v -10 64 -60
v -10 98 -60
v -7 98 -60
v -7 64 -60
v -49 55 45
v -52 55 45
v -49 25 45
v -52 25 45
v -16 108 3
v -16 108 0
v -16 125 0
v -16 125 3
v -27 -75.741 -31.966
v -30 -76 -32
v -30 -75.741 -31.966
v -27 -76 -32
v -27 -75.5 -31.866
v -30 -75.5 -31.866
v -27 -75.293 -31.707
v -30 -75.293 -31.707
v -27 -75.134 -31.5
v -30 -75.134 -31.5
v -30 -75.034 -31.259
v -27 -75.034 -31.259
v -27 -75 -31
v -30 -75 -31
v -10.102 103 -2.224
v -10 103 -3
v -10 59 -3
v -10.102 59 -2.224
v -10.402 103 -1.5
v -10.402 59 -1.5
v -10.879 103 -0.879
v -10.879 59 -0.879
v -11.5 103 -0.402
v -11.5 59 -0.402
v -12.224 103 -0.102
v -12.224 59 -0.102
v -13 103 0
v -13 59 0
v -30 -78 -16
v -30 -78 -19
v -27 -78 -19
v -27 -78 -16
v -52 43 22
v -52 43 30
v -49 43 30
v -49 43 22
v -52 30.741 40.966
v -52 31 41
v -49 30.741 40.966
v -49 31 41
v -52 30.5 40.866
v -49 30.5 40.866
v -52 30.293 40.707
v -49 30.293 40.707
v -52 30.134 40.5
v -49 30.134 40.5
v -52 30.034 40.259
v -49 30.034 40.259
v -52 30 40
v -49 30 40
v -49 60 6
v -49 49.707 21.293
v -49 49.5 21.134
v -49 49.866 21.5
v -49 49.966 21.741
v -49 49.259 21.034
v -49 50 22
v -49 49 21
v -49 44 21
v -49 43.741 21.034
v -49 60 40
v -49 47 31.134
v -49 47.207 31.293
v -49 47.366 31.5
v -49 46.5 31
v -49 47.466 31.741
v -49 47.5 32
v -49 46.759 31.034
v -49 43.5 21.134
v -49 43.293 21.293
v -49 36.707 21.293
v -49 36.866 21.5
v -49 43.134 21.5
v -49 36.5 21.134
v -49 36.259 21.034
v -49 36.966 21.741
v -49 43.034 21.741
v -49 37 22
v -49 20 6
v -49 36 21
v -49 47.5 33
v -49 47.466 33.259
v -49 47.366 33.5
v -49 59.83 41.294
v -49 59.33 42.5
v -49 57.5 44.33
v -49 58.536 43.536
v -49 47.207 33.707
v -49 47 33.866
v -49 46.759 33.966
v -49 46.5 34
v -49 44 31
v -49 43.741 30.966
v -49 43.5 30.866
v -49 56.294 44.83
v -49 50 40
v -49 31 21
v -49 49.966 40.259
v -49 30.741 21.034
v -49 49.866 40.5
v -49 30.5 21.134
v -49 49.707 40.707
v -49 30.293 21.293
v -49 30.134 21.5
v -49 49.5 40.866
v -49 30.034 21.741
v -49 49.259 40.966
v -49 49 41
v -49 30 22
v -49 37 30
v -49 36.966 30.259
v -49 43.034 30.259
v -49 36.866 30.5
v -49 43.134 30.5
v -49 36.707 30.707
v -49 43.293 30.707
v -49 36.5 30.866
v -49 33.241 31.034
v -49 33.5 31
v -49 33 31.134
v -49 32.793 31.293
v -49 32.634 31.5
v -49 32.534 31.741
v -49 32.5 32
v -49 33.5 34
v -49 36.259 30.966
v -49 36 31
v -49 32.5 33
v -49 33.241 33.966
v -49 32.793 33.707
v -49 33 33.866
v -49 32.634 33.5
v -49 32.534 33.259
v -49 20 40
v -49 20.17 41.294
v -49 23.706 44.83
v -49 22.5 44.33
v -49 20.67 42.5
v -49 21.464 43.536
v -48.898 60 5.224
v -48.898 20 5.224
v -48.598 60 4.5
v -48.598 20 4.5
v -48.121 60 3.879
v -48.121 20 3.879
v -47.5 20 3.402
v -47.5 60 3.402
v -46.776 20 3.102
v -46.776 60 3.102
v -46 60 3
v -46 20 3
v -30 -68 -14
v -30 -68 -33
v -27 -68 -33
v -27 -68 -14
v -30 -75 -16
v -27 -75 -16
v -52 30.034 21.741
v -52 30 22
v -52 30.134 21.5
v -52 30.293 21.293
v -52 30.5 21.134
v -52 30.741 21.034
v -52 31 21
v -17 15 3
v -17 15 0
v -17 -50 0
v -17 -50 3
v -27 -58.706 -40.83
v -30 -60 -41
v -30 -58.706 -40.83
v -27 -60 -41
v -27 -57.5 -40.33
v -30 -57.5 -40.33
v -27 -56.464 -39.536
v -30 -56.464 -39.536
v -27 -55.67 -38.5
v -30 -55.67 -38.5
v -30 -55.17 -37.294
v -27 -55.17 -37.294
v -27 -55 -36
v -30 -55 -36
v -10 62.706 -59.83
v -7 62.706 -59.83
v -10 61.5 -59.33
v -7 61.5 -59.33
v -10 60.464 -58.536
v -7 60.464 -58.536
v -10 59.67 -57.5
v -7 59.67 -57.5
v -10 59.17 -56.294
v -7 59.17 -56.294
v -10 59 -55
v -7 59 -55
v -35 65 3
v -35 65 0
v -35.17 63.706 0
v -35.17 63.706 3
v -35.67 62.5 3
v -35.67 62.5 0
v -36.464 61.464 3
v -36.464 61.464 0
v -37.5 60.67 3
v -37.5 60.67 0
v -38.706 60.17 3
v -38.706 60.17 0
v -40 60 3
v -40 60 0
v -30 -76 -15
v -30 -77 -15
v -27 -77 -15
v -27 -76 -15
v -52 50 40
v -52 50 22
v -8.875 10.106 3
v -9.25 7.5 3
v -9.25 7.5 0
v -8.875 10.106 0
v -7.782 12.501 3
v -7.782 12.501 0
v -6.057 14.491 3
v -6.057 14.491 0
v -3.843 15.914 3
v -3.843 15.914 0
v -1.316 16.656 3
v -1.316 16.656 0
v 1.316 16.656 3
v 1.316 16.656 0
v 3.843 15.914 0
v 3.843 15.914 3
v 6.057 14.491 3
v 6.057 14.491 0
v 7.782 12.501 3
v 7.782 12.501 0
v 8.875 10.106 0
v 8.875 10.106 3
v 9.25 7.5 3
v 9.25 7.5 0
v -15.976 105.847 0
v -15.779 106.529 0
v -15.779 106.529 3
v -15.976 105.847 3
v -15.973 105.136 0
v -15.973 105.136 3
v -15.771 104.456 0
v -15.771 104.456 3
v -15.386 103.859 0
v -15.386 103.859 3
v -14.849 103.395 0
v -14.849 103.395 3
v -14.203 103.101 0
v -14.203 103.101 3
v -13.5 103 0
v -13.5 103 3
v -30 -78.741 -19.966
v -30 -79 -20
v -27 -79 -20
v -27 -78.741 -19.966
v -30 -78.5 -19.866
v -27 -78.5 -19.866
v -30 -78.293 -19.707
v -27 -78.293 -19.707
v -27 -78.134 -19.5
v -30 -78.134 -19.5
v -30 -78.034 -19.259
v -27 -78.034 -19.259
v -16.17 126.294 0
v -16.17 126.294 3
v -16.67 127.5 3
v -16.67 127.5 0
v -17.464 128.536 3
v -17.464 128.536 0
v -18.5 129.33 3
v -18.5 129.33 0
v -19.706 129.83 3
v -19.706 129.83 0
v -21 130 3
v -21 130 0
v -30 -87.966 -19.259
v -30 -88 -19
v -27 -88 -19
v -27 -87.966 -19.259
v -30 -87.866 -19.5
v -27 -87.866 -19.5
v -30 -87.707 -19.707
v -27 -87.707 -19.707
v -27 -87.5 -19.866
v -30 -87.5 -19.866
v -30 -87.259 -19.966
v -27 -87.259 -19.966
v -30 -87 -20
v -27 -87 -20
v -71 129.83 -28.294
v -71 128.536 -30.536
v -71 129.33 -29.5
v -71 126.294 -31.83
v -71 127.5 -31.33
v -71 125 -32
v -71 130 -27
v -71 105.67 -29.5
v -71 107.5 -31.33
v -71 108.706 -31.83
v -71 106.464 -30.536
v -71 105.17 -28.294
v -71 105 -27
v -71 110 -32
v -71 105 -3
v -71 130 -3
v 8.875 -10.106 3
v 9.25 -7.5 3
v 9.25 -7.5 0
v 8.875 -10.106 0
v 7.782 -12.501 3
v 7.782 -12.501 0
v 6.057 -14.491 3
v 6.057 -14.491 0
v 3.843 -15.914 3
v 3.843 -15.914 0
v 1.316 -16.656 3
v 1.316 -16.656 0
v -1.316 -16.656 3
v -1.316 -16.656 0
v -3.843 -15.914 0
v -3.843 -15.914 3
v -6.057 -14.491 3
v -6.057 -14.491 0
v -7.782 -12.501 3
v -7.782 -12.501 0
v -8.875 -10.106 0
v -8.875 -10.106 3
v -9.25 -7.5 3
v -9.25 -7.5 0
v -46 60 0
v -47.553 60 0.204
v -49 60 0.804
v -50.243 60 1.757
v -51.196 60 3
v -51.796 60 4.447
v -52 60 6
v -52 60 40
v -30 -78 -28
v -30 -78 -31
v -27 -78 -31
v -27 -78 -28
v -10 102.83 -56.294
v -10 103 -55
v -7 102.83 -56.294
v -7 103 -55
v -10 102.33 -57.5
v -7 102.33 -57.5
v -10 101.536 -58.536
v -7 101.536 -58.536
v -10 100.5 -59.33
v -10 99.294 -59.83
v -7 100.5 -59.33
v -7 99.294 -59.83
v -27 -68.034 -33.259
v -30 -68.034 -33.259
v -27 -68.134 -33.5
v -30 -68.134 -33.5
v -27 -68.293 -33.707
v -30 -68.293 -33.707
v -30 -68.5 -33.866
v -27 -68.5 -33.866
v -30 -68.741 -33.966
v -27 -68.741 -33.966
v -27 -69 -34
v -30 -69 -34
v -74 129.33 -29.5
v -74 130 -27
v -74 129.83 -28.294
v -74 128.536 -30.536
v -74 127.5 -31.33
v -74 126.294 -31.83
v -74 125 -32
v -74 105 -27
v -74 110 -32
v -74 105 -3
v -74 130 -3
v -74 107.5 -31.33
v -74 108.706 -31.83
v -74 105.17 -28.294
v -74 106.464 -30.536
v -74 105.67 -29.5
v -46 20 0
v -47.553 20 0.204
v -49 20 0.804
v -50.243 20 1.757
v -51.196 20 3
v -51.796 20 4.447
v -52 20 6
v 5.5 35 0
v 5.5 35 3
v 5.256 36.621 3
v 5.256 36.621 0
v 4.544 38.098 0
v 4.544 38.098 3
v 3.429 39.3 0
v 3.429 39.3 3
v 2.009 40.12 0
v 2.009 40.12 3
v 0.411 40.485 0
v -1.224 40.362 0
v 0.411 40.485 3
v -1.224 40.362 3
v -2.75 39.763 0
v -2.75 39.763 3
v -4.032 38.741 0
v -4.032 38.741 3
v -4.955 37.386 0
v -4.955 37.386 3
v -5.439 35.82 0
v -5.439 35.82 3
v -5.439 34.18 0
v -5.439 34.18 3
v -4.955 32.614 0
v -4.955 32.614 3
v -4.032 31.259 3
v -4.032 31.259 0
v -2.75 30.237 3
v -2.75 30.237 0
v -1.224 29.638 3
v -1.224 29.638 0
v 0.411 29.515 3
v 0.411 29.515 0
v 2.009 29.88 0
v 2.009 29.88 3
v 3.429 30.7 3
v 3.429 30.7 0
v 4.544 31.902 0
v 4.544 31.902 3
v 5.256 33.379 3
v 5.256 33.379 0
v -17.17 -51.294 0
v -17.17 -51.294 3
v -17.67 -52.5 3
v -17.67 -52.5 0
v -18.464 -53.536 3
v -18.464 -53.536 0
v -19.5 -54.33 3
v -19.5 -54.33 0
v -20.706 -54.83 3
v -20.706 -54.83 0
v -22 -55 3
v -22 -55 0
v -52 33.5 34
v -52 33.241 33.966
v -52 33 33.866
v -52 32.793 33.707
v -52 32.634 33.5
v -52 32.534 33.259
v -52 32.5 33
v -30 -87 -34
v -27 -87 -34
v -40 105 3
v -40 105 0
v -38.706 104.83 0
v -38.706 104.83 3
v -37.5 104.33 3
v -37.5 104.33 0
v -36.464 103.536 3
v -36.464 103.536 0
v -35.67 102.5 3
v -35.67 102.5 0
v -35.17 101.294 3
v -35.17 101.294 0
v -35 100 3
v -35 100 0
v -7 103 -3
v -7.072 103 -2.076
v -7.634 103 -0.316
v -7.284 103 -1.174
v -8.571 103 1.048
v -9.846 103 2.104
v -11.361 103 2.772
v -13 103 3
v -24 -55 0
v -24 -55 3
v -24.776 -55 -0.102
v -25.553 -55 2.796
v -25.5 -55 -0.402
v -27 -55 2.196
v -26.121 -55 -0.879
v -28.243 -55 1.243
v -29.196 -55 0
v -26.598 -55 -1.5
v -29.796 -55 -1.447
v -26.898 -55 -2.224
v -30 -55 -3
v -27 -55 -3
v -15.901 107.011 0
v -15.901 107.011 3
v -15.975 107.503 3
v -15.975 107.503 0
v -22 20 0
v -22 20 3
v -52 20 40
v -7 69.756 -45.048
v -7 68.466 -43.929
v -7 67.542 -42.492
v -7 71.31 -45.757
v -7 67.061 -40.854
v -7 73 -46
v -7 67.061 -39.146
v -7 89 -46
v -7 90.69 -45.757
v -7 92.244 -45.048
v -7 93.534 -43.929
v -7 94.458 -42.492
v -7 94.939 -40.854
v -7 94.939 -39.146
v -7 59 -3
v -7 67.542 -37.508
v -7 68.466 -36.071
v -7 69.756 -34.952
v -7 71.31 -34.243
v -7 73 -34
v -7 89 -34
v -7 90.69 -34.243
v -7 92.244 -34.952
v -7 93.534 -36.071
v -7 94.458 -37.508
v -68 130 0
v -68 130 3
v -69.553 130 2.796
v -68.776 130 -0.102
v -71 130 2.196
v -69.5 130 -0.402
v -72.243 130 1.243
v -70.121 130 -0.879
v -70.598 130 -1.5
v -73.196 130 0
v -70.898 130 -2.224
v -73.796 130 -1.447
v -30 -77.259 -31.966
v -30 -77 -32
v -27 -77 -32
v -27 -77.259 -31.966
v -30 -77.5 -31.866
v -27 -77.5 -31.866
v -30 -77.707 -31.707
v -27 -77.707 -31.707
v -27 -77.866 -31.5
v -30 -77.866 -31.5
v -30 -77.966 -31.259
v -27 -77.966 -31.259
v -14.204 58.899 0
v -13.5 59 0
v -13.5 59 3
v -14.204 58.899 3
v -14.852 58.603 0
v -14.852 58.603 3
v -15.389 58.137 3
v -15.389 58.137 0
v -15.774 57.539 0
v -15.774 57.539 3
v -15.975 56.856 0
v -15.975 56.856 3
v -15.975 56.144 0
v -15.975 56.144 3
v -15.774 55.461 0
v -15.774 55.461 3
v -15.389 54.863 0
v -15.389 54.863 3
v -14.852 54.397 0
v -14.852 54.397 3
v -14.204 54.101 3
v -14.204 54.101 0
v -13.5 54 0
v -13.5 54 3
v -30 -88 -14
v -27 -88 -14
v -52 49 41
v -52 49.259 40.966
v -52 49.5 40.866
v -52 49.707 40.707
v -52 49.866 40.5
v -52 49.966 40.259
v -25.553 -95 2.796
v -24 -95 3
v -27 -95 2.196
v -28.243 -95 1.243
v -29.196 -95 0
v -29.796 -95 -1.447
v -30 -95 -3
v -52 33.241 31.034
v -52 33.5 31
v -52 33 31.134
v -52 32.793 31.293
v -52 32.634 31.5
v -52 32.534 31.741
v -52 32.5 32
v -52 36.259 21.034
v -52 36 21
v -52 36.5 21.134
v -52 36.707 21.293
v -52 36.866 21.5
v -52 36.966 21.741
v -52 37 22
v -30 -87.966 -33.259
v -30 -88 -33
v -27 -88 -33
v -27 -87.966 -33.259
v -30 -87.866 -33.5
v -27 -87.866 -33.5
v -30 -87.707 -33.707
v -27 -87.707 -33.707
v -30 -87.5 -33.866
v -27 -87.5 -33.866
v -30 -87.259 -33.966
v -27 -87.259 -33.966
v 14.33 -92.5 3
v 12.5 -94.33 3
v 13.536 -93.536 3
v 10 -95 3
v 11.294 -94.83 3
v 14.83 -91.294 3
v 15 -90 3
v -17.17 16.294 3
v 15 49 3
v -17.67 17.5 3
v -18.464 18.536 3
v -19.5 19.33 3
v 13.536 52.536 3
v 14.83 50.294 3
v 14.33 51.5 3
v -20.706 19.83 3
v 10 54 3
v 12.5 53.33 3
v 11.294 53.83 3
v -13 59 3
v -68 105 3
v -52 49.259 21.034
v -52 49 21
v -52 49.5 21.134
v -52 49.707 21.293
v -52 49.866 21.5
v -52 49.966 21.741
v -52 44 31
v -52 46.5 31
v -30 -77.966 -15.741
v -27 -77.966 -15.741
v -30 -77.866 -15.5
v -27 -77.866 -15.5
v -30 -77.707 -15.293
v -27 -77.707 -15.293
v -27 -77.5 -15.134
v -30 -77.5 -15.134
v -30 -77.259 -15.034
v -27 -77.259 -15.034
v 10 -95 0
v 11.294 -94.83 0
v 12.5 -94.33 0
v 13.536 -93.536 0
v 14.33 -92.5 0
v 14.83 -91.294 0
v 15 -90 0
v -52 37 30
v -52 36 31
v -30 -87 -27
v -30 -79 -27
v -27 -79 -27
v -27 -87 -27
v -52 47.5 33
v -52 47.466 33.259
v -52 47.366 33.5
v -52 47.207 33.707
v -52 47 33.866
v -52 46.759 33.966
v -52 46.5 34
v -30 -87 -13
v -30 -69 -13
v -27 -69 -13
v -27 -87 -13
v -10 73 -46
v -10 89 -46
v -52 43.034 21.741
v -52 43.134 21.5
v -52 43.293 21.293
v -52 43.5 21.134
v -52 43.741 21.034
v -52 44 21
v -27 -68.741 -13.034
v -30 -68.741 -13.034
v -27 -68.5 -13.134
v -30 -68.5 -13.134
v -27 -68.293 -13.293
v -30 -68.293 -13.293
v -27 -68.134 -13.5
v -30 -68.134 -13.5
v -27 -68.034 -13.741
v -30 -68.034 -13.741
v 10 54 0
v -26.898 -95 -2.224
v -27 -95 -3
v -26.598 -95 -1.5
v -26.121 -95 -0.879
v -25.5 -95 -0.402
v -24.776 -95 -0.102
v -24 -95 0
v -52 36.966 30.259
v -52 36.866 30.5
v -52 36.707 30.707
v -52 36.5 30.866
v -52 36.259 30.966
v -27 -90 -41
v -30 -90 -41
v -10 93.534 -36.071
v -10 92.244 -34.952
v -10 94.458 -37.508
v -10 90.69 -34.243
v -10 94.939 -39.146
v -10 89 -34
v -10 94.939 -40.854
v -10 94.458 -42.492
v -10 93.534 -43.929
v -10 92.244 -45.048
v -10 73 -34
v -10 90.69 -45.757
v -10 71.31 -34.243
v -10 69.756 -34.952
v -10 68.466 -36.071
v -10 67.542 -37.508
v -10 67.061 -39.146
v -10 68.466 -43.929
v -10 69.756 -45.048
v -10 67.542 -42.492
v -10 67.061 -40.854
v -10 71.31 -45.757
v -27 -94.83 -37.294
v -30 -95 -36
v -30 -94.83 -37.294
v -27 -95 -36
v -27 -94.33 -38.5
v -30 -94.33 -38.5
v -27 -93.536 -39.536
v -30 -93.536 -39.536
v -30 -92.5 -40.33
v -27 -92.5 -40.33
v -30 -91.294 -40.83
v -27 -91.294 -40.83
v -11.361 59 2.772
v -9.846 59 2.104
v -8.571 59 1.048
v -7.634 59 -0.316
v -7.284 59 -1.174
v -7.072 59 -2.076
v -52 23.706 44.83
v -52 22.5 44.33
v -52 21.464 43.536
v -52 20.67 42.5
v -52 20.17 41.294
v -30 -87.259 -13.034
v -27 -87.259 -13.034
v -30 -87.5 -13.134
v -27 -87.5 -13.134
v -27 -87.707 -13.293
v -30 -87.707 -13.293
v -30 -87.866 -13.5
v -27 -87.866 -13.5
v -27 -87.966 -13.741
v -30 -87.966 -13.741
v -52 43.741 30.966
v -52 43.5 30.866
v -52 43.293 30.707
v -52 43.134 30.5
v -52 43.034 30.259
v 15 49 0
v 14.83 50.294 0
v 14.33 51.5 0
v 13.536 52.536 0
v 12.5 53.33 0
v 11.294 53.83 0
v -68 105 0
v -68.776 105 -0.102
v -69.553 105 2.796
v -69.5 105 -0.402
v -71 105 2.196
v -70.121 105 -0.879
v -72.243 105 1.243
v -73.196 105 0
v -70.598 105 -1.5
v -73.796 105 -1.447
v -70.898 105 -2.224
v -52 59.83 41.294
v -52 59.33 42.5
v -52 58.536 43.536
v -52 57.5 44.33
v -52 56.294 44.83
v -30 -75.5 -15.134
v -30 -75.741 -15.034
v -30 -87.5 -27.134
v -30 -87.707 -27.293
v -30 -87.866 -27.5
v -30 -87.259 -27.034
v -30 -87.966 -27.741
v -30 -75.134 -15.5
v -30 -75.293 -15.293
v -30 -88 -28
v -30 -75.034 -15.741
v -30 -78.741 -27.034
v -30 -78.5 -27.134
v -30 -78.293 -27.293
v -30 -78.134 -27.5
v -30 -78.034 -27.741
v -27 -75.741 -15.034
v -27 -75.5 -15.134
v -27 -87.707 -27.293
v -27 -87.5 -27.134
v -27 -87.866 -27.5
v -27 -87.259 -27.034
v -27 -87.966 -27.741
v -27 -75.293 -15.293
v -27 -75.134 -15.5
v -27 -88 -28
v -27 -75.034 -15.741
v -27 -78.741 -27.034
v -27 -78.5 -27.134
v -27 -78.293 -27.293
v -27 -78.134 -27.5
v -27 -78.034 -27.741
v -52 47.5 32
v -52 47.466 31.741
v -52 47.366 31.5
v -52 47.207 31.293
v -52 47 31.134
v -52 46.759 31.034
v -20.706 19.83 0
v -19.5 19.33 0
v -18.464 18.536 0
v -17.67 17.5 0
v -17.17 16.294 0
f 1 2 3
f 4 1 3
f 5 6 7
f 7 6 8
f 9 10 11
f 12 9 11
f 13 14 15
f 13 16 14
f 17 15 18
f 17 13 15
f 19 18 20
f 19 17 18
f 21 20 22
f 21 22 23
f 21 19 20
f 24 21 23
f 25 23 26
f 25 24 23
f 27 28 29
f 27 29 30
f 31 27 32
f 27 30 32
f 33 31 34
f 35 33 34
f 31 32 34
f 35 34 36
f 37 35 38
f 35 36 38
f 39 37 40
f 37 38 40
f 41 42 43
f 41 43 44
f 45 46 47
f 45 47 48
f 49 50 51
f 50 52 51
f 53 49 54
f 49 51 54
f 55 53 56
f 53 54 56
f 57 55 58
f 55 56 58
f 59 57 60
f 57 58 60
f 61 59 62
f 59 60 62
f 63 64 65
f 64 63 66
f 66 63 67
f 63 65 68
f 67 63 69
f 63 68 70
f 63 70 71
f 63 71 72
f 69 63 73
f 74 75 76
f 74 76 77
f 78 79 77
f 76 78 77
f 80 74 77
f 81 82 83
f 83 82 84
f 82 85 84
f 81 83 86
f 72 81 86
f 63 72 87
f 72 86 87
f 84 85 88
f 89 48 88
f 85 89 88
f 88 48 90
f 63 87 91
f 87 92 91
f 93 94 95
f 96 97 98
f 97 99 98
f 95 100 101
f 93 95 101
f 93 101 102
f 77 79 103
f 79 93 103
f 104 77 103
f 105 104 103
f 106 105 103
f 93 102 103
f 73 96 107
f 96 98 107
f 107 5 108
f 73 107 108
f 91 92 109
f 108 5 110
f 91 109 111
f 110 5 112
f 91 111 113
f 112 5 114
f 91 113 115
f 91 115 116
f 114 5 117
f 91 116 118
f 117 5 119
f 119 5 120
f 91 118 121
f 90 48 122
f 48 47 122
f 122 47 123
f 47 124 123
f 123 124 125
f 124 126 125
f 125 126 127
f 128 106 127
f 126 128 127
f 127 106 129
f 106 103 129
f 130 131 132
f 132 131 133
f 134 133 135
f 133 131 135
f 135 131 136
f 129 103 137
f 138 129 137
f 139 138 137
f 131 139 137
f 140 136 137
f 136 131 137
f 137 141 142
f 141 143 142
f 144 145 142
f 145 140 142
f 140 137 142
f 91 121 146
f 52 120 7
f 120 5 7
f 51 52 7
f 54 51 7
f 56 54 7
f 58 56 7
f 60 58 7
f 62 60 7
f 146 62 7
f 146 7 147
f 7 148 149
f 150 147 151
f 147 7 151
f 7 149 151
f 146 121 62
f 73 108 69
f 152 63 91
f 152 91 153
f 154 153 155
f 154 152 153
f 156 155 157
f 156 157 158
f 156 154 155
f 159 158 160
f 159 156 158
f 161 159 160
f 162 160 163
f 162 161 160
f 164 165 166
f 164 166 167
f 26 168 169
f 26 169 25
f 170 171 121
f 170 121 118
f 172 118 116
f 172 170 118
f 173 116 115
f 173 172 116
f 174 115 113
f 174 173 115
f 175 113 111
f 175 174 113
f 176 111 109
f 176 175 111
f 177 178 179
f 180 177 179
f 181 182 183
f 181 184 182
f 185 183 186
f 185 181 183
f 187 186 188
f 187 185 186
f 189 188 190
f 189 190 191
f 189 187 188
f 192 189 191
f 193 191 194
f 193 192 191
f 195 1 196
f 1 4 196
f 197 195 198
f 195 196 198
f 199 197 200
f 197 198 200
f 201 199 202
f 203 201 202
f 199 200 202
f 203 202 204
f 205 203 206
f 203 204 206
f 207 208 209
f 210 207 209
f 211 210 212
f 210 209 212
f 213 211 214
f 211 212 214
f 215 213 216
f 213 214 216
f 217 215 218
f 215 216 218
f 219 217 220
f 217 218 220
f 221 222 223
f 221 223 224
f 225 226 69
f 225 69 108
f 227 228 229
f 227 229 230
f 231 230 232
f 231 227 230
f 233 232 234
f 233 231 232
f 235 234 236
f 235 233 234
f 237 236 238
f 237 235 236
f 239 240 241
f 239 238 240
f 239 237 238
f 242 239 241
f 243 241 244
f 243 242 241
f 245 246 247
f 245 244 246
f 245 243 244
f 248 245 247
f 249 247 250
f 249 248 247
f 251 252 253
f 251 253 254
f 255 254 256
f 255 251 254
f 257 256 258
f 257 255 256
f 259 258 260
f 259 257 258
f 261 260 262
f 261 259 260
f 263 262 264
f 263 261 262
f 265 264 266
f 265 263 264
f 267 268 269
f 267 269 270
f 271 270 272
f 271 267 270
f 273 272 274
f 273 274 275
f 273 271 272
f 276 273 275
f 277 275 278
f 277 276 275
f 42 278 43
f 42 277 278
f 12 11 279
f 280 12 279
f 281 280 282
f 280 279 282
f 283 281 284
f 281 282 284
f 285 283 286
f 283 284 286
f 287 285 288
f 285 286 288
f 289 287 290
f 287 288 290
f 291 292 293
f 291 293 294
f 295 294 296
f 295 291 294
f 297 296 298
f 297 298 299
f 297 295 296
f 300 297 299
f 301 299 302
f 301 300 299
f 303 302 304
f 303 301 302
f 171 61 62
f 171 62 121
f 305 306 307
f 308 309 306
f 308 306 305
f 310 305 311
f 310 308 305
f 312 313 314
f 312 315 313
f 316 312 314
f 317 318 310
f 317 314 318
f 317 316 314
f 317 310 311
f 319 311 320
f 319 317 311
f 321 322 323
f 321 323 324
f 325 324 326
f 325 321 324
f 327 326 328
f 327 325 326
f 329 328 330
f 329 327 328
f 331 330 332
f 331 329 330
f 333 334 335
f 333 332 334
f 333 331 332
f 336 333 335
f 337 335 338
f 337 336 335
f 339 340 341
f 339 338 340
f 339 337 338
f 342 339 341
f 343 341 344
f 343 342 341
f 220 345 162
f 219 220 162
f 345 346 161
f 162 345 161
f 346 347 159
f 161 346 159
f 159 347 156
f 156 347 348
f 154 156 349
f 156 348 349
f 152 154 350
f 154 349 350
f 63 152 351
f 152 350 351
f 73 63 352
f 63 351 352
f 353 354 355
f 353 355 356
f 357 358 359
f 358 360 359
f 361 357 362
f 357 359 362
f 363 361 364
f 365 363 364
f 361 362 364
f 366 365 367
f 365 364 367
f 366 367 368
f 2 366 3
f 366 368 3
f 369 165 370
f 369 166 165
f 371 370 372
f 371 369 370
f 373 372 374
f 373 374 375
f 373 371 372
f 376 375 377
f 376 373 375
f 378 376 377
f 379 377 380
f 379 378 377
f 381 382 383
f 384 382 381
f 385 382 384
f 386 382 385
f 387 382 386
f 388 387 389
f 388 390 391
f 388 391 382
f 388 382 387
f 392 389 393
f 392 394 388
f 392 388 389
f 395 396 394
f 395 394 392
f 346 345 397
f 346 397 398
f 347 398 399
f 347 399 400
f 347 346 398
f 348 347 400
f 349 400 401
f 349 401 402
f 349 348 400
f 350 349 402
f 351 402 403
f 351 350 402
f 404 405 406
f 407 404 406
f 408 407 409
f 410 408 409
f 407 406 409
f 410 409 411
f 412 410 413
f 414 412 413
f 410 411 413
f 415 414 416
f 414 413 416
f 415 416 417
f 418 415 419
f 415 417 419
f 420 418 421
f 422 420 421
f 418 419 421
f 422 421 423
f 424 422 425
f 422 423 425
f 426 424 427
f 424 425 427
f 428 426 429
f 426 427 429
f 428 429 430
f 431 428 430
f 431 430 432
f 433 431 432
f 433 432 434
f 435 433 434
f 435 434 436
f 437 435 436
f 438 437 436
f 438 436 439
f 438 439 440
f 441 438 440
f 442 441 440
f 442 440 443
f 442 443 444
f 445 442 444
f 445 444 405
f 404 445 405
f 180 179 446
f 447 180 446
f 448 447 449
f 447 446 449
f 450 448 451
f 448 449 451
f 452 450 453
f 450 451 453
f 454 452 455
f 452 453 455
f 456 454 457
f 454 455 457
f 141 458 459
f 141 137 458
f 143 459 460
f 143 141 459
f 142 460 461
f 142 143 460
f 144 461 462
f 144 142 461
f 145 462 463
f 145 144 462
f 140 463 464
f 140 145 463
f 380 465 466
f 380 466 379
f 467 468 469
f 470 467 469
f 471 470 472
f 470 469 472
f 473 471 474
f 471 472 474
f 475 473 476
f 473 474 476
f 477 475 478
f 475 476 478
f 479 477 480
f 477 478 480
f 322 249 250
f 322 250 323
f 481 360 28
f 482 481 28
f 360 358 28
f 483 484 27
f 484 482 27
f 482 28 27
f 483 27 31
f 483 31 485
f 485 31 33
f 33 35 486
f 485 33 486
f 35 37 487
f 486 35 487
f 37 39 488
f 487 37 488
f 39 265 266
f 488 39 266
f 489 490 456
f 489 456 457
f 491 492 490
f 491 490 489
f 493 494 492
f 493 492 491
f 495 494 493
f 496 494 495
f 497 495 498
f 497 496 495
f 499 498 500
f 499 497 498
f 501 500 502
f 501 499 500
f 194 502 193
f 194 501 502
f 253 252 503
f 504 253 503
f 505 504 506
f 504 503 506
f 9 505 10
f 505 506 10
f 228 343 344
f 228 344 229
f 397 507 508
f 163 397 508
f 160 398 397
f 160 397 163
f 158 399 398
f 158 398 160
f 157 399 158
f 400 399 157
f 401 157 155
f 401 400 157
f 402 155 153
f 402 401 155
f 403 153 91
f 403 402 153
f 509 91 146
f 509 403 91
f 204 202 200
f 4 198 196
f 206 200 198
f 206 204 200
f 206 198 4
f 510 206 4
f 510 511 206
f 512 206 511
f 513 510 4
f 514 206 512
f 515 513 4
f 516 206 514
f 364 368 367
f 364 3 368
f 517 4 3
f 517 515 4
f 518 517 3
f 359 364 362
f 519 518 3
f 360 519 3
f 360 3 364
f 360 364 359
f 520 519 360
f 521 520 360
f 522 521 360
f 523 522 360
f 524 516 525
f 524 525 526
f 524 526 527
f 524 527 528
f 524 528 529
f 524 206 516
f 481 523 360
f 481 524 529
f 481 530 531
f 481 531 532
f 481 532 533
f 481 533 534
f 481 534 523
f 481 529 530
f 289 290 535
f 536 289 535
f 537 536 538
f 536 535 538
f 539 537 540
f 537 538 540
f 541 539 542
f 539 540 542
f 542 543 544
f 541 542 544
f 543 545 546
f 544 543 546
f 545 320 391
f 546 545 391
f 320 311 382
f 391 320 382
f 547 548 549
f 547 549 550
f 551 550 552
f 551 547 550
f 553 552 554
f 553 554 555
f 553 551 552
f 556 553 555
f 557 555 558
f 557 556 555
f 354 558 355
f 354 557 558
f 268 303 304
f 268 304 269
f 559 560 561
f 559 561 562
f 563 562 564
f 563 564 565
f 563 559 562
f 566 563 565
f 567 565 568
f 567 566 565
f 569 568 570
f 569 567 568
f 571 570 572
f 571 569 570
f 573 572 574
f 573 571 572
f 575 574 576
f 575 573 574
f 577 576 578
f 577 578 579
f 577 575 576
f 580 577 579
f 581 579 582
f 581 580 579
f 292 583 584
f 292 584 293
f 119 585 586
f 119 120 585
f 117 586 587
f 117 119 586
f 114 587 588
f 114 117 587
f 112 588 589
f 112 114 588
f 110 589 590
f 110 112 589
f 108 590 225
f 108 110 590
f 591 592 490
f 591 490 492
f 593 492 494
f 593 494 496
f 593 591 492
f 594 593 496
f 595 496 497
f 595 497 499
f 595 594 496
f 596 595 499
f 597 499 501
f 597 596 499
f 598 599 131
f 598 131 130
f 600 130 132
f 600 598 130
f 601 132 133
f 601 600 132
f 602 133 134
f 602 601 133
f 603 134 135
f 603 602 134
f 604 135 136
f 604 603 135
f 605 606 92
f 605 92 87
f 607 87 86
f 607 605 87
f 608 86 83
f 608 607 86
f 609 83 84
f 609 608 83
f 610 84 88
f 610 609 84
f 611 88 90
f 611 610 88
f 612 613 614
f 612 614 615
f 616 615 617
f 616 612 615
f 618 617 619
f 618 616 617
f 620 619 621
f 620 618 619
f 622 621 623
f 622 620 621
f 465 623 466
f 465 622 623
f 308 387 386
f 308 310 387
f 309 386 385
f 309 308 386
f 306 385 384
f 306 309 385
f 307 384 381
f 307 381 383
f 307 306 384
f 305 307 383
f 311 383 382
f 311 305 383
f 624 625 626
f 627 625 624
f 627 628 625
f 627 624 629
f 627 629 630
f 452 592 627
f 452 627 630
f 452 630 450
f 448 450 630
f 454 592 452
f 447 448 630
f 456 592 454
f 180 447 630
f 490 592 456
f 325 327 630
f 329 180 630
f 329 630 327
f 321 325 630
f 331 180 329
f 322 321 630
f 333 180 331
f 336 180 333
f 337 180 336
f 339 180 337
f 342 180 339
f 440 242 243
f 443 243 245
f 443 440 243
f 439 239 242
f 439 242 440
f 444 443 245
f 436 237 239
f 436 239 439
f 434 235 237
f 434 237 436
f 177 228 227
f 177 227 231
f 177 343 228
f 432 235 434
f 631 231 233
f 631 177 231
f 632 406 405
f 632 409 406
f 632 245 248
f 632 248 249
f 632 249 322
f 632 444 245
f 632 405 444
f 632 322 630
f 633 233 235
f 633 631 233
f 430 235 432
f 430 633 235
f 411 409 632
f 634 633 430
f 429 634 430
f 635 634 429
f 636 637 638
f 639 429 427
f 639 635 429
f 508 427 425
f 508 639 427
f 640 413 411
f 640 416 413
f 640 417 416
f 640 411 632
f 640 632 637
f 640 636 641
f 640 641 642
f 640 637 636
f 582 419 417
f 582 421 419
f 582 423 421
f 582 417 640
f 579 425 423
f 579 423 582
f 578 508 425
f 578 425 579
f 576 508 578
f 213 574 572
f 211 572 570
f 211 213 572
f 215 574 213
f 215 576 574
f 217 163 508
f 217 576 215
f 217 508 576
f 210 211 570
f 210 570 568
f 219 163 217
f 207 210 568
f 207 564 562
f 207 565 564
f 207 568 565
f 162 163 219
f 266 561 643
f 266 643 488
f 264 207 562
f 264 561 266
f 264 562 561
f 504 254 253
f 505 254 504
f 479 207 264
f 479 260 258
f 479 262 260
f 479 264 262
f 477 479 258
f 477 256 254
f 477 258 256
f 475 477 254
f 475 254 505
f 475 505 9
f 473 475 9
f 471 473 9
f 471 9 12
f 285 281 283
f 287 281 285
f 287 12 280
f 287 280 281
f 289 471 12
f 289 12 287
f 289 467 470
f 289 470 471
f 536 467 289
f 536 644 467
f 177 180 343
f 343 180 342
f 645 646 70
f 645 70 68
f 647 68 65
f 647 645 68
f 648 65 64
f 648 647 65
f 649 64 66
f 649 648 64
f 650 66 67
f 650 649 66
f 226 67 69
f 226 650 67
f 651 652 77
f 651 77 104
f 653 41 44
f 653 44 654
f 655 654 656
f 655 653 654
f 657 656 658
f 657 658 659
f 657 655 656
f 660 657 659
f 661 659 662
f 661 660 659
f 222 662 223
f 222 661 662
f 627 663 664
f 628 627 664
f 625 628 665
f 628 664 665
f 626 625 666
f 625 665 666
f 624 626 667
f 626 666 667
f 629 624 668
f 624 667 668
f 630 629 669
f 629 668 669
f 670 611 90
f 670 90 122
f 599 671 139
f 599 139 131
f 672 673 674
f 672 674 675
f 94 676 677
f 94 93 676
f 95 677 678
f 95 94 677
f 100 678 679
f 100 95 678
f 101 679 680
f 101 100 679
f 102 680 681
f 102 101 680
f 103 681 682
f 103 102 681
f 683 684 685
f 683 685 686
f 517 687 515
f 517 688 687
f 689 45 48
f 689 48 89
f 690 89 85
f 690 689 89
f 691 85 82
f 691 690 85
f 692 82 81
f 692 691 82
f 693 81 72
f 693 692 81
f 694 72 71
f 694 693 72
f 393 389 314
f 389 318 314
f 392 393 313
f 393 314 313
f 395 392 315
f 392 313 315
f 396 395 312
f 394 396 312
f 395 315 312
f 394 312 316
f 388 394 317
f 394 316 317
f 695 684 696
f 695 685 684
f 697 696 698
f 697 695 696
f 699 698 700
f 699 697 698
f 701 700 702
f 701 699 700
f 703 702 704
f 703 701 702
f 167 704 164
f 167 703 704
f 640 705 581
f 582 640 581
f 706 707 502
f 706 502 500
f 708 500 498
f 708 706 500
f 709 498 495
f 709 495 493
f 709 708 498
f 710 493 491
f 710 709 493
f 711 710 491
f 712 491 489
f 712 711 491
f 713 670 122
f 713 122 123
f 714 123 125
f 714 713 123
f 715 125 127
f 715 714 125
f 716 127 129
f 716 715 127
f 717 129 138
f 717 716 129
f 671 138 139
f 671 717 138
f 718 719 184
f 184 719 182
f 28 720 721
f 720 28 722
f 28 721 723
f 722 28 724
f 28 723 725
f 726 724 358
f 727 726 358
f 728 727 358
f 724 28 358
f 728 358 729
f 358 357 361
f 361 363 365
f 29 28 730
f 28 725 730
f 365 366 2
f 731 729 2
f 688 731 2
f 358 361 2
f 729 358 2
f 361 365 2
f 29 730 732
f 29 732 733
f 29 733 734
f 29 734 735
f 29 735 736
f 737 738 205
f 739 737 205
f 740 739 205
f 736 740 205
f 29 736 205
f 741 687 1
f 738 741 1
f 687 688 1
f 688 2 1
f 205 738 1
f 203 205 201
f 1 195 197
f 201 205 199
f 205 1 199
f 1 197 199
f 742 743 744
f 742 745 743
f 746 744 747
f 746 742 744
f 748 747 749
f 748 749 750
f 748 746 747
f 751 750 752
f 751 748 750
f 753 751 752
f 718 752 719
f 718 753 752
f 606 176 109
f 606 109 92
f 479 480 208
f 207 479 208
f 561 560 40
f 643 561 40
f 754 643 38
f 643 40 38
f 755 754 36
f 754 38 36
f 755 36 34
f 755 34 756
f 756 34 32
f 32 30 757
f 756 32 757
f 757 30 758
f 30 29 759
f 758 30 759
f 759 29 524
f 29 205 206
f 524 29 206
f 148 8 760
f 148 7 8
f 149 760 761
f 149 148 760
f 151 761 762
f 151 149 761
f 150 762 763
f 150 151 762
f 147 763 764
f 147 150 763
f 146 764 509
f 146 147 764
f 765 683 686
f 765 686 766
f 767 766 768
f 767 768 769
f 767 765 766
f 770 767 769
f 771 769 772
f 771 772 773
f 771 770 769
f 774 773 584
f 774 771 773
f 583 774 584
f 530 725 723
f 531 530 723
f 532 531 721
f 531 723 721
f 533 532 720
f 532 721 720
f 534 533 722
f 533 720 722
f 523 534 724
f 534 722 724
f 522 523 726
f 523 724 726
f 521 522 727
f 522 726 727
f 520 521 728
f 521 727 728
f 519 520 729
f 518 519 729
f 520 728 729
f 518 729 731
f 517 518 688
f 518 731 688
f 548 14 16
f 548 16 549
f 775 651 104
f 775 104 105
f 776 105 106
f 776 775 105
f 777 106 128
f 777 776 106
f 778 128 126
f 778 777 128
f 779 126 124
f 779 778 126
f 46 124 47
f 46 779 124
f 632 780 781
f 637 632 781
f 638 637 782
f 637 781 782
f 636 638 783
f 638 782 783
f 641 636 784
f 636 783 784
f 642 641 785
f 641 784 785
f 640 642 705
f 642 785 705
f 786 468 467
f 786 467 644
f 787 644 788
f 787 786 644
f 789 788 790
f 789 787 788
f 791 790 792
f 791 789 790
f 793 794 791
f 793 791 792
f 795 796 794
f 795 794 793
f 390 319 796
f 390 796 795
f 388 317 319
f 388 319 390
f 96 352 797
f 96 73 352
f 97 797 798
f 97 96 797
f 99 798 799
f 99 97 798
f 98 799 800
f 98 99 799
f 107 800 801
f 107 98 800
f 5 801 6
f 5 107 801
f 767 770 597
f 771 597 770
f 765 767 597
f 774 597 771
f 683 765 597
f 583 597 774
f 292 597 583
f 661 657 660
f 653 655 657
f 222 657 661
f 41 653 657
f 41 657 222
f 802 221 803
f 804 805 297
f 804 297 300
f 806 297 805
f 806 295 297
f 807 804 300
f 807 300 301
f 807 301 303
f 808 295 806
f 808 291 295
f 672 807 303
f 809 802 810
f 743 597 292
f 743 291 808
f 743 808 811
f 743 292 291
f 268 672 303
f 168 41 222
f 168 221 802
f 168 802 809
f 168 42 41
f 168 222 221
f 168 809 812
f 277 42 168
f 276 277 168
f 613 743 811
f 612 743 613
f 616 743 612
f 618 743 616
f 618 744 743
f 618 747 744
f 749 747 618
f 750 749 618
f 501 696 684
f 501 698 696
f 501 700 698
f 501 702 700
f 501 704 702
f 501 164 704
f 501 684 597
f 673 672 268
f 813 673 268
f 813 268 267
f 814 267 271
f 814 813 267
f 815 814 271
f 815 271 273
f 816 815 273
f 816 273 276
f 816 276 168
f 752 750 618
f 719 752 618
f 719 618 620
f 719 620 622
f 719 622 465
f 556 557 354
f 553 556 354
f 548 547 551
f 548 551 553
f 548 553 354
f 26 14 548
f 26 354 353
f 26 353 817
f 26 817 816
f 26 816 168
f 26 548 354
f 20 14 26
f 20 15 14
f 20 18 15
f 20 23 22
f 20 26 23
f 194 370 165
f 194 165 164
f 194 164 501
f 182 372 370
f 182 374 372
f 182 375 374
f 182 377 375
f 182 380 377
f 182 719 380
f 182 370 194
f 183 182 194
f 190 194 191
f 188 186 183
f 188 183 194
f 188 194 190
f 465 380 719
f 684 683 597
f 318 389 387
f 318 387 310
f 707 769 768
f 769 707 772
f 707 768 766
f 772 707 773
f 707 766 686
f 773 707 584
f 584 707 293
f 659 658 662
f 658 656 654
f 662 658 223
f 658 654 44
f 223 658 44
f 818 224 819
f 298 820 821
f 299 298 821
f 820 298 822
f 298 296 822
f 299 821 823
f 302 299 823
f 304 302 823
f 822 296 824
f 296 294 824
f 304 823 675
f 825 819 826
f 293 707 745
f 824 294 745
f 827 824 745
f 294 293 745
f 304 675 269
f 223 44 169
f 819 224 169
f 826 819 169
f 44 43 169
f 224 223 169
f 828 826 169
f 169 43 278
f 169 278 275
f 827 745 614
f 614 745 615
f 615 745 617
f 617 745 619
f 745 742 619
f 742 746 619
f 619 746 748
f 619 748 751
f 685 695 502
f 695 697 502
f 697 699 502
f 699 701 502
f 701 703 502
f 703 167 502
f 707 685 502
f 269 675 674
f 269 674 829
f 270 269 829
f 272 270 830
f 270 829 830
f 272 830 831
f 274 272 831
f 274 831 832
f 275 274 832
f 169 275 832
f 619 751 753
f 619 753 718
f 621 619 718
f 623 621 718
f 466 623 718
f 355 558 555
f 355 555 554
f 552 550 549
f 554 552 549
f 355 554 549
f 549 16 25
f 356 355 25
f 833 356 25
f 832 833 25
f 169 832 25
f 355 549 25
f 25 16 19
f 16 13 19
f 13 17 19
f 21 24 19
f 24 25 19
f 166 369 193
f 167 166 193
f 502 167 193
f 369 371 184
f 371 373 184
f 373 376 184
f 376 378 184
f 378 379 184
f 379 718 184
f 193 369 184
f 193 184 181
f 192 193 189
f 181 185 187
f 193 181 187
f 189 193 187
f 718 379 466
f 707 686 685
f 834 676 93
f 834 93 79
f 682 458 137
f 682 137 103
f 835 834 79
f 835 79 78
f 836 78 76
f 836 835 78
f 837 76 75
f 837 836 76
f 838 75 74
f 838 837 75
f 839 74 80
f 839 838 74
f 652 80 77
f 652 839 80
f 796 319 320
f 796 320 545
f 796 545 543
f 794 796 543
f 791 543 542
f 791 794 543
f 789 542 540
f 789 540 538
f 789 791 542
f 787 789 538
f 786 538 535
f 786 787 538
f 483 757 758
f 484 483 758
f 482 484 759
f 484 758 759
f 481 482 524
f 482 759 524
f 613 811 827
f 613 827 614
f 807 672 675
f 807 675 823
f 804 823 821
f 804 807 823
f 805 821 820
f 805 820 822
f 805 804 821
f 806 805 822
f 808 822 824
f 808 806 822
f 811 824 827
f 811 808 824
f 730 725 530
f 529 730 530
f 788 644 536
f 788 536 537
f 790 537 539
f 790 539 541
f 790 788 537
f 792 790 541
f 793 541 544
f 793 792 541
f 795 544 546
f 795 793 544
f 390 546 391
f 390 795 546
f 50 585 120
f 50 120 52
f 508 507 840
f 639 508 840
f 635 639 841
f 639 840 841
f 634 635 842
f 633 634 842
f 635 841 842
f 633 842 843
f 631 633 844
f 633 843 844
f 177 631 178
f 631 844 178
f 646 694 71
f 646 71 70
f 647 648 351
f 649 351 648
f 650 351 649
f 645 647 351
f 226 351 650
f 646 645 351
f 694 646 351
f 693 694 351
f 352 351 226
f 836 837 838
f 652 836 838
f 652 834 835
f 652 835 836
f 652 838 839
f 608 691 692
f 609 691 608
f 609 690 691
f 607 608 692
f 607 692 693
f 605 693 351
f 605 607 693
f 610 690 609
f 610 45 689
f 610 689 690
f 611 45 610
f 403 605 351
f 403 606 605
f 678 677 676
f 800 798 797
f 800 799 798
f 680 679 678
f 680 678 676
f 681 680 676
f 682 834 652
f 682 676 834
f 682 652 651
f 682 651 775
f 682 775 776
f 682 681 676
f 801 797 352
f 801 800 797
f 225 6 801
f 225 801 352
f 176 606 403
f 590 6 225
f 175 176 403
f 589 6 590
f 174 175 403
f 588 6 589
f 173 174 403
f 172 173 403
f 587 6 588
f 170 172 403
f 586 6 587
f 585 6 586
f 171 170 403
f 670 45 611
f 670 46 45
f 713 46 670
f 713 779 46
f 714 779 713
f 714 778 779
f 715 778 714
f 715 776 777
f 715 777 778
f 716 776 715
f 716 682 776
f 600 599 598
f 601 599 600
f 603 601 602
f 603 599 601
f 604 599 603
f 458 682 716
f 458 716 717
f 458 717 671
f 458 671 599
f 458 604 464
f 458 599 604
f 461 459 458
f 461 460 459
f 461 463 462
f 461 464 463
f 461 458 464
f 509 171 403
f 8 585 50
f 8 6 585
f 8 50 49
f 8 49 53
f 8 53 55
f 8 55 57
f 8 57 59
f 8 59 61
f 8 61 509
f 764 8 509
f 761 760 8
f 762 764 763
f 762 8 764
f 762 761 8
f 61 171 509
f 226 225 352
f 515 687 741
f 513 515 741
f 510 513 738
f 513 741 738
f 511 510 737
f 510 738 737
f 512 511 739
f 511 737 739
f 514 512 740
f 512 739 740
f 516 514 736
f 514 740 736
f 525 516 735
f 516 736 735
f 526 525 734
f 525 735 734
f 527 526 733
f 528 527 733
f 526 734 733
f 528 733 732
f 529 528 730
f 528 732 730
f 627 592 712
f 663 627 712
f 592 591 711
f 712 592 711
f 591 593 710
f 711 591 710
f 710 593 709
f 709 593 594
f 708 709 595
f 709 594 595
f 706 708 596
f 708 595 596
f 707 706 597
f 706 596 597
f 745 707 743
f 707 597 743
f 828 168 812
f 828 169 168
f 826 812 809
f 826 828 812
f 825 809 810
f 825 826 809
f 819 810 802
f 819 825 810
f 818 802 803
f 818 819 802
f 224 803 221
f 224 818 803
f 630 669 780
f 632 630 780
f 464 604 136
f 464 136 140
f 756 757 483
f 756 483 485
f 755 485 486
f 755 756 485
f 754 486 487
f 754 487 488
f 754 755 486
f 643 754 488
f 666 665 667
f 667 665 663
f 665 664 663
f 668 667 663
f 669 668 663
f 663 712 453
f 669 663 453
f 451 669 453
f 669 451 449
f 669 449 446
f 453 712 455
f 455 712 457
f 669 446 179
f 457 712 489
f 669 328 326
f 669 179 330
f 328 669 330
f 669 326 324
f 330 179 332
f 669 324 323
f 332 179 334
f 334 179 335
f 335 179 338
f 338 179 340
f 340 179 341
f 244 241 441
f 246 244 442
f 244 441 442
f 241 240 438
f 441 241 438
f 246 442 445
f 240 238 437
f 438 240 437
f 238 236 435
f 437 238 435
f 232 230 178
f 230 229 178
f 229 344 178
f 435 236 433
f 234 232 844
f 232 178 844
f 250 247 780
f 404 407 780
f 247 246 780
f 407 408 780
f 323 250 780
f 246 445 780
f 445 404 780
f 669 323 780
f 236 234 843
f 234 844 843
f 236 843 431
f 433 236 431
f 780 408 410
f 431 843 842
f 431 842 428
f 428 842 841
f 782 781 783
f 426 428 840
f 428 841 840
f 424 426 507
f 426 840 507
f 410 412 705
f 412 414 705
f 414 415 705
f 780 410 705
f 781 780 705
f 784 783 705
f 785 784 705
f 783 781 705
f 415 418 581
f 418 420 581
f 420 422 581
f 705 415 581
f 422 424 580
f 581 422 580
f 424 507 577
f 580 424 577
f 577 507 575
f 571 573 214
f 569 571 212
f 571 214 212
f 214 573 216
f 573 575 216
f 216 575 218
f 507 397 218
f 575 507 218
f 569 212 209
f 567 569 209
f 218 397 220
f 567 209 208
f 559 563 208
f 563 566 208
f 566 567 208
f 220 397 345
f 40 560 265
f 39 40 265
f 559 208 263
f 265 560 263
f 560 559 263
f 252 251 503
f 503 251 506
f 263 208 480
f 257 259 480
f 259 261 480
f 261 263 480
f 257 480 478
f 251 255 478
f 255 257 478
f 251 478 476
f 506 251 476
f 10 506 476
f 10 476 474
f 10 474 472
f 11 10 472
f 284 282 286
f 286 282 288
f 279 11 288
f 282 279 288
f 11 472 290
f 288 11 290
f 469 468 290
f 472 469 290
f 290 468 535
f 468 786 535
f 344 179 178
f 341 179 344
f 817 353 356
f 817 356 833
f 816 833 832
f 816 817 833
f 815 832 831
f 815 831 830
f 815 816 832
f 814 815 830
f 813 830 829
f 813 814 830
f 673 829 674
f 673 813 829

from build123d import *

# Parameters (mm, degrees)
BASE_FLANGE1_DEPTH           = 3
SKETCH6_R                    = 5.5
CUT_EXTRUDE1_DEPTH           = 10
EDGE_FLANGE2_START           = -6.5
EDGE_FLANGE2_OUTLINE_W       = 5
EDGE_FLANGE2_OUTLINE_H       = 3
EDGE_FLANGE2_DEPTH           = 6.5
EDGE_FLANGE2_START_2         = -0.63372
EDGE_FLANGE2_2_OUTLINE_W     = 44
EDGE_FLANGE2_2_OUTLINE_H     = 3
EDGE_FLANGE2_2_DEPTH         = 0.63372
EDGE_FLANGE2_START_3         = -3
EDGE_FLANGE2_3_OUTLINE_W     = 44
EDGE_FLANGE2_3_OUTLINE_H     = 60
EDGE_FLANGE2_3_DEPTH         = 2.36628
EDGE_FLANGE2_4_DEPTH         = 3
EDGE_FLANGE2_START_4         = -34
EDGE_FLANGE2_5_OUTLINE_W     = 0.63372
EDGE_FLANGE2_5_OUTLINE_H     = 44
EDGE_FLANGE2_5_DEPTH         = 31
EDGE_FLANGE2_START_5         = -60
EDGE_FLANGE2_6_OUTLINE_W     = 0.63372
EDGE_FLANGE2_6_OUTLINE_H     = 44
EDGE_FLANGE2_6_DEPTH         = 14
EDGE_FLANGE2_START_6         = 59
EDGE_FLANGE2_7_DEPTH         = 44
EDGE_FLANGE2_8_OUTLINE_W     = 0.63372
EDGE_FLANGE2_8_OUTLINE_H     = 12
EDGE_FLANGE2_8_DEPTH         = 2.2355
EDGE_FLANGE2_START_7         = -7.63372
EDGE_FLANGE2_9_DEPTH         = 0.63372
EDGE_FLANGE2_10_DEPTH        = 44
EDGE_FLANGE2_START_8         = -7.76405
EDGE_FLANGE2_11_OUTLINE_W    = 44
EDGE_FLANGE2_11_OUTLINE_H    = 3
EDGE_FLANGE2_11_DEPTH        = 0.13033
FILLET1_R                    = 5
EDGE_FLANGE3_STRIP_W         = 18
EDGE_FLANGE3_STRIP_H         = 3
EDGE_FLANGE3_STRIP_CUT_DEPTH = 25
EDGE_FLANGE3_DEPTH           = 25
FILLET2_R                    = 5
EDGE_FLANGE4_STRIP_W         = 18
EDGE_FLANGE4_STRIP_H         = 3
EDGE_FLANGE4_STRIP_CUT_DEPTH = 40
EDGE_FLANGE4_DEPTH           = 40
EDGE_FLANGE4_PROFILE_W       = 40
EDGE_FLANGE4_PROFILE_H       = 39
EDGE_FLANGE4_FLAT_DEPTH      = 3
FILLET3_R                    = 1
FILLET4_R                    = 5
EDGE_FLANGE5_STRIP_W         = 18
EDGE_FLANGE5_STRIP_H         = 3
EDGE_FLANGE5_STRIP_CUT_DEPTH = 40
EDGE_FLANGE5_DEPTH           = 40
EDGE_FLANGE5_PROFILE_W       = 40
EDGE_FLANGE5_PROFILE_H       = 38
EDGE_FLANGE5_FLAT_DEPTH      = 3
FILLET5_R                    = 1
FILLET6_R                    = 5


with BuildPart() as part:
    # Base-Flange1: sheet metal written as solids
    # Sketch1 → Base-Flange1 (new body)
    with BuildSketch(Plane(origin=(0, 0, 0), x_dir=(0, 1, 0), z_dir=(0, 0, 1))):
        with BuildLine():
            Line((-90, -15), (49, -15))
            ThreePointArc((49, -15), (52.535533906, -13.535533906), (54, -10))
            Line((54, -10), (54, 7))
            Line((54, 7), (103, 7))
            Line((103, 7), (103, 11))
            ThreePointArc((103, 11), (104.464466094, 14.535533906), (108, 16))
            Line((108, 16), (125, 16))
            ThreePointArc((125, 16), (128.535533906, 17.464466094), (130, 21))
            Line((130, 21), (130, 74))
            Line((130, 74), (105, 74))
            Line((105, 74), (105, 40))
            ThreePointArc((105, 40), (103.535533906, 36.464466094), (100, 35))
            Line((100, 35), (65, 35))
            ThreePointArc((65, 35), (61.464466094, 36.464466094), (60, 40))
            Line((60, 40), (60, 52))
            Line((60, 52), (20, 52))
            Line((20, 52), (20, 22))
            ThreePointArc((20, 22), (18.535533906, 18.464466094), (15, 17))
            Line((15, 17), (-50, 17))
            ThreePointArc((-50, 17), (-53.535533906, 18.464466094), (-55, 22))
            Line((-55, 22), (-55, 30))
            Line((-55, 30), (-95, 30))
            Line((-95, 30), (-95, -10))
            ThreePointArc((-95, -10), (-93.535533906, -13.535533906), (-90, -15))
        make_face()
    extrude(amount=BASE_FLANGE1_DEPTH)

    # Sketch6 → Cut-Extrude1 (cut)
    with BuildSketch(Plane.XY.offset(3)):
        with Locations((0, 35)):
            Circle(SKETCH6_R)
        with BuildLine():
            Line((9.25, 7.5), (9.25, -7.5))
            ThreePointArc((9.25, -7.5), (0, -16.75), (-9.25, -7.5))
            Line((-9.25, -7.5), (-9.25, 7.5))
            ThreePointArc((-9.25, 7.5), (0, 16.75), (9.25, 7.5))
        make_face()
    extrude(amount=-CUT_EXTRUDE1_DEPTH, mode=Mode.SUBTRACT)

    # Edge-Flange2: read off the stored shape, not the designer's step
    # Edge-Flange2 outline → Edge-Flange2 (cut)
    with BuildSketch(Plane(origin=(-7, 0, 0), x_dir=(0, -1, 0), z_dir=(1, 0, 0)).offset(EDGE_FLANGE2_START)):
        with Locations((-56.5, -1.5)):
            Rectangle(EDGE_FLANGE2_OUTLINE_W, EDGE_FLANGE2_OUTLINE_H)
    extrude(amount=EDGE_FLANGE2_DEPTH, mode=Mode.SUBTRACT)

    # Edge-Flange2 2 outline → Edge-Flange2 2 (cut)
    with BuildSketch(Plane(origin=(-7, 0, 0), x_dir=(0, -1, 0), z_dir=(1, 0, 0)).offset(EDGE_FLANGE2_START_2)):
        with Locations((-81, -1.5)):
            Rectangle(EDGE_FLANGE2_2_OUTLINE_W, EDGE_FLANGE2_2_OUTLINE_H)
    extrude(amount=EDGE_FLANGE2_2_DEPTH, mode=Mode.SUBTRACT)

    # Edge-Flange2 3 outline → Edge-Flange2 3 (add)
    with BuildSketch(Plane(origin=(-7, 0, 0), x_dir=(0, -1, 0), z_dir=(1, 0, 0)).offset(EDGE_FLANGE2_START_3)):
        with Locations((-81, 30)):
            Rectangle(EDGE_FLANGE2_3_OUTLINE_W, EDGE_FLANGE2_3_OUTLINE_H)
        with BuildLine():
            Line((-73, 34), (-89, 34))
            ThreePointArc((-89, 34), (-95, 40), (-89, 46))
            Line((-89, 46), (-73, 46))
            ThreePointArc((-73, 46), (-67, 40), (-73, 34))
        make_face(mode=Mode.SUBTRACT)
    extrude(amount=EDGE_FLANGE2_3_DEPTH)

    # Edge-Flange2 4 outline → Edge-Flange2 4 (cut)
    with BuildSketch(Plane.XY):
        with BuildLine():
            Line((-13.5, 54), (-13.5, 59))
            ThreePointArc((-13.5, 59), (-16, 56.5), (-13.5, 54))
        make_face()
        with BuildLine():
            Line((-13.5, 103), (-11, 103))
            ThreePointArc((-11, 103), (-13.970098723, 103.977747698), (-15.778594569, 106.528594569))
            ThreePointArc((-15.778594569, 106.528594569), (-15.600176948, 104.143807982), (-13.5, 103))
        make_face()
    extrude(amount=EDGE_FLANGE2_4_DEPTH, mode=Mode.SUBTRACT)

    # Edge-Flange2 5 outline → Edge-Flange2 5 (add)
    with BuildSketch(Plane.XY.offset(EDGE_FLANGE2_START_4)):
        with Locations((-7.31686, 81)):
            Rectangle(EDGE_FLANGE2_5_OUTLINE_W, EDGE_FLANGE2_5_OUTLINE_H)
    extrude(amount=EDGE_FLANGE2_5_DEPTH)

    # Edge-Flange2 6 outline → Edge-Flange2 6 (add)
    with BuildSketch(Plane.XY.offset(EDGE_FLANGE2_START_5)):
        with Locations((-7.31686, 81)):
            Rectangle(EDGE_FLANGE2_6_OUTLINE_W, EDGE_FLANGE2_6_OUTLINE_H)
    extrude(amount=EDGE_FLANGE2_6_DEPTH)

    # Edge-Flange2 7 outline → Edge-Flange2 7 (add)
    with BuildSketch(Plane(origin=(0, 0, 0), x_dir=(1, 0, 0), z_dir=(0, 1, 0)).offset(EDGE_FLANGE2_START_6)):
        with BuildLine():
            ThreePointArc((-7.63372, 0.31615221), (-7.160578796, 1.621174413), (-7, 3))
            Line((-7, 3), (-7.63372, 3))
            Line((-7.63372, 3), (-7.63372, 0.31615221))
        make_face()
        with BuildLine():
            Line((-13, 0), (-10, 0))
            Line((-10, 0), (-10, 3))
            ThreePointArc((-10, 3), (-10.878679656, 0.878679656), (-13, 0))
        make_face()
    extrude(amount=EDGE_FLANGE2_7_DEPTH)

    # Edge-Flange2 8 outline → Edge-Flange2 8 (add)
    with BuildSketch(Plane(origin=(0, 0, 0), x_dir=(1, 0, 0), z_dir=(0, 1, 0)).offset(EDGE_FLANGE2_START_6)):
        with Locations((-7.31686, 40)):
            Rectangle(EDGE_FLANGE2_8_OUTLINE_W, EDGE_FLANGE2_8_OUTLINE_H)
    extrude(amount=EDGE_FLANGE2_8_DEPTH)

    # Edge-Flange2 9 outline → Edge-Flange2 9 (add)
    with BuildSketch(Plane.YZ.offset(EDGE_FLANGE2_START_7)):
        with BuildLine():
            Line((103, -46), (103, -34))
            Line((103, -34), (89, -34))
            ThreePointArc((89, -34), (95, -40), (89, -46))
            Line((89, -46), (103, -46))
        make_face()
        with BuildLine():
            Line((73, -34), (59, -34))
            Line((59, -34), (59, -46))
            Line((59, -46), (73, -46))
            ThreePointArc((73, -46), (67, -40), (73, -34))
        make_face()
    extrude(amount=EDGE_FLANGE2_9_DEPTH)

    # Edge-Flange2 10 outline → Edge-Flange2 10 (cut)
    with BuildSketch(Plane(origin=(0, 0, 0), x_dir=(1, 0, 0), z_dir=(0, 1, 0)).offset(EDGE_FLANGE2_START_6)):
        with BuildLine():
            ThreePointArc((-7.63372, 0.31615221), (-9.845882591, -2.104071254), (-13, -3))
            Line((-13, -3), (-7.63372, -3))
            Line((-7.63372, -3), (-7.63372, 0.31615221))
        make_face()
    extrude(amount=EDGE_FLANGE2_10_DEPTH, mode=Mode.SUBTRACT)

    # Edge-Flange2 11 outline → Edge-Flange2 11 (cut)
    with BuildSketch(Plane.YZ.offset(EDGE_FLANGE2_START_8)):
        with Locations((81, 1.5)):
            Rectangle(EDGE_FLANGE2_11_OUTLINE_W, EDGE_FLANGE2_11_OUTLINE_H)
    extrude(amount=EDGE_FLANGE2_11_DEPTH, mode=Mode.SUBTRACT)

    # Fillet1
    fillet1_edges = [part.edges().sort_by_distance(p)[0] for p in [
        (-8.5, 103, -60),
        (-8.5, 59, -60),
    ]]
    fillet(fillet1_edges, radius=FILLET1_R)

    # Edge-Flange3: sheet metal written as solids
    # Edge-Flange3 strip (on a plane across the edge) → Edge-Flange3 strip cut (cut)
    with BuildSketch(Plane(origin=(-74, 105, 0), x_dir=(1, 0, 0), z_dir=(0, 1, 0))):
        with Locations((-3, -1.5)):
            Rectangle(EDGE_FLANGE3_STRIP_W, EDGE_FLANGE3_STRIP_H)
    extrude(amount=EDGE_FLANGE3_STRIP_CUT_DEPTH, mode=Mode.SUBTRACT)

    # Edge-Flange3 section (on a plane across the edge) → Edge-Flange3 (add)
    with BuildSketch(Plane(origin=(-74, 105, 0), x_dir=(1, 0, 0), z_dir=(0, 1, 0))):
        with BuildLine():
            Line((0, 3), (0, 32))
            Line((0, 32), (3, 32))
            Line((3, 32), (3, 3))
            ThreePointArc((3, 3), (3.878679656, 0.878679656), (6, 0))
            Line((6, 0), (6, -3))
            ThreePointArc((6, -3), (1.757359313, -1.242640687), (0, 3))
        make_face()
    extrude(amount=EDGE_FLANGE3_DEPTH)

    # Fillet2
    fillet2_edges = [part.edges().sort_by_distance(p)[0] for p in [
        (-72.5, 105, -32),
        (-72.5, 130, -32),
    ]]
    fillet(fillet2_edges, radius=FILLET2_R)

    # Edge-Flange4: sheet metal written as solids
    # Edge-Flange4 strip (on a plane across the edge) → Edge-Flange4 strip cut (cut)
    with BuildSketch(Plane(origin=(-52, 60, 3), x_dir=(1, 0, 0), z_dir=(0, -1, 0))):
        with Locations((-3, -1.5)):
            Rectangle(EDGE_FLANGE4_STRIP_W, EDGE_FLANGE4_STRIP_H)
    extrude(amount=EDGE_FLANGE4_STRIP_CUT_DEPTH, mode=Mode.SUBTRACT)

    # Edge-Flange4 bend section (on a plane across the edge) → Edge-Flange4 (add)
    with BuildSketch(Plane(origin=(-52, 60, 3), x_dir=(1, 0, 0), z_dir=(0, -1, 0))):
        with BuildLine():
            Line((0, 3), (3, 3))
            ThreePointArc((3, 3), (3.878679656, 0.878679656), (6, 0))
            Line((6, 0), (6, -3))
            ThreePointArc((6, -3), (1.757359313, -1.242640687), (0, 3))
        make_face()
    extrude(amount=EDGE_FLANGE4_DEPTH)

    # Edge-Flange4 profile (on flange) → Edge-Flange4 flat (add)
    with BuildSketch(Plane(origin=(-52, 0, 3), x_dir=(0, -1, 0), z_dir=(-1, 0, 0))):
        with Locations((-40, 22.5)):
            Rectangle(EDGE_FLANGE4_PROFILE_W, EDGE_FLANGE4_PROFILE_H)
        with BuildLine():
            Line((-30, 38), (-30, 19))
            ThreePointArc((-30, 19), (-30.292893219, 18.292893219), (-31, 18))
            Line((-31, 18), (-36, 18))
            ThreePointArc((-36, 18), (-36.707106781, 18.292893219), (-37, 19))
            Line((-37, 19), (-37, 27))
            ThreePointArc((-37, 27), (-36.707106781, 27.707106781), (-36, 28))
            Line((-36, 28), (-33.5, 28))
            ThreePointArc((-33.5, 28), (-32.792893219, 28.292893219), (-32.5, 29))
            Line((-32.5, 29), (-32.5, 31))
            Line((-32.5, 31), (-47.5, 31))
            Line((-47.5, 31), (-47.5, 29))
            ThreePointArc((-47.5, 29), (-47.207106781, 28.292893219), (-46.5, 28))
            Line((-46.5, 28), (-44, 28))
            ThreePointArc((-44, 28), (-43.292893219, 27.707106781), (-43, 27))
            Line((-43, 27), (-43, 19))
            ThreePointArc((-43, 19), (-43.292893219, 18.292893219), (-44, 18))
            Line((-44, 18), (-49, 18))
            ThreePointArc((-49, 18), (-49.707106781, 18.292893219), (-50, 19))
            Line((-50, 19), (-50, 38))
            Line((-50, 38), (-30, 38))
        make_face(mode=Mode.SUBTRACT)
    extrude(amount=-EDGE_FLANGE4_FLAT_DEPTH)

    # Fillet3
    fillet3_edges = [part.edges().sort_by_distance(p)[0] for p in [
        (-50.5, 30, 41),
        (-50.5, 50, 41),
        (-50.5, 47.5, 34),
        (-50.5, 32.5, 34),
    ]]
    fillet(fillet3_edges, radius=FILLET3_R)

    # Fillet4
    fillet4_edges = [part.edges().sort_by_distance(p)[0] for p in [
        (-50.5, 60, 45),
        (-50.5, 20, 45),
    ]]
    fillet(fillet4_edges, radius=FILLET4_R)

    # Edge-Flange5: sheet metal written as solids
    # Edge-Flange5 strip (on a plane across the edge) → Edge-Flange5 strip cut (cut)
    with BuildSketch(Plane(origin=(-30, -95, 0), x_dir=(1, 0, 0), z_dir=(0, 1, 0))):
        with Locations((-3, -1.5)):
            Rectangle(EDGE_FLANGE5_STRIP_W, EDGE_FLANGE5_STRIP_H)
    extrude(amount=EDGE_FLANGE5_STRIP_CUT_DEPTH, mode=Mode.SUBTRACT)

    # Edge-Flange5 bend section (on a plane across the edge) → Edge-Flange5 (add)
    with BuildSketch(Plane(origin=(-30, -95, 0), x_dir=(1, 0, 0), z_dir=(0, 1, 0))):
        with BuildLine():
            Line((0, 3), (3, 3))
            ThreePointArc((3, 3), (3.878679656, 0.878679656), (6, 0))
            Line((6, 0), (6, -3))
            ThreePointArc((6, -3), (1.757359313, -1.242640687), (0, 3))
        make_face()
    extrude(amount=EDGE_FLANGE5_DEPTH)

    # Edge-Flange5 profile (on flange) → Edge-Flange5 flat (add)
    with BuildSketch(Plane(origin=(-30, 0, 0), x_dir=(0, 1, 0), z_dir=(-1, 0, 0))):
        with Locations((-75, 22)):
            Rectangle(EDGE_FLANGE5_PROFILE_W, EDGE_FLANGE5_PROFILE_H)
        with BuildLine():
            ThreePointArc((-88, 33), (-87.707106781, 33.707106781), (-87, 34))
            Line((-87, 34), (-68, 34))
            Line((-68, 34), (-68, 13))
            Line((-68, 13), (-87, 13))
            ThreePointArc((-87, 13), (-87.707106781, 13.292893219), (-88, 14))
            Line((-88, 14), (-88, 19))
            ThreePointArc((-88, 19), (-87.707106781, 19.707106781), (-87, 20))
            Line((-87, 20), (-79, 20))
            ThreePointArc((-79, 20), (-78.292893219, 19.707106781), (-78, 19))
            Line((-78, 19), (-78, 16))
            ThreePointArc((-78, 16), (-77.707106781, 15.292893219), (-77, 15))
            Line((-77, 15), (-75, 15))
            Line((-75, 15), (-75, 32))
            Line((-75, 32), (-77, 32))
            ThreePointArc((-77, 32), (-77.707106781, 31.707106781), (-78, 31))
            Line((-78, 31), (-78, 28))
            ThreePointArc((-78, 28), (-78.292893219, 27.292893219), (-79, 27))
            Line((-79, 27), (-87, 27))
            ThreePointArc((-87, 27), (-87.707106781, 27.292893219), (-88, 28))
            Line((-88, 28), (-88, 33))
        make_face(mode=Mode.SUBTRACT)
    extrude(amount=-EDGE_FLANGE5_FLAT_DEPTH)

    # Fillet5
    fillet5_edges = [part.edges().sort_by_distance(p)[0] for p in [
        (-28.5, -68, -13),
        (-28.5, -68, -34),
        (-28.5, -75, -32),
        (-28.5, -75, -15),
    ]]
    fillet(fillet5_edges, radius=FILLET5_R)

    # Fillet6
    fillet6_edges = [part.edges().sort_by_distance(p)[0] for p in [
        (-28.5, -95, -41),
        (-28.5, -55, -41),
    ]]
    fillet(fillet6_edges, radius=FILLET6_R)


solid = part.part
